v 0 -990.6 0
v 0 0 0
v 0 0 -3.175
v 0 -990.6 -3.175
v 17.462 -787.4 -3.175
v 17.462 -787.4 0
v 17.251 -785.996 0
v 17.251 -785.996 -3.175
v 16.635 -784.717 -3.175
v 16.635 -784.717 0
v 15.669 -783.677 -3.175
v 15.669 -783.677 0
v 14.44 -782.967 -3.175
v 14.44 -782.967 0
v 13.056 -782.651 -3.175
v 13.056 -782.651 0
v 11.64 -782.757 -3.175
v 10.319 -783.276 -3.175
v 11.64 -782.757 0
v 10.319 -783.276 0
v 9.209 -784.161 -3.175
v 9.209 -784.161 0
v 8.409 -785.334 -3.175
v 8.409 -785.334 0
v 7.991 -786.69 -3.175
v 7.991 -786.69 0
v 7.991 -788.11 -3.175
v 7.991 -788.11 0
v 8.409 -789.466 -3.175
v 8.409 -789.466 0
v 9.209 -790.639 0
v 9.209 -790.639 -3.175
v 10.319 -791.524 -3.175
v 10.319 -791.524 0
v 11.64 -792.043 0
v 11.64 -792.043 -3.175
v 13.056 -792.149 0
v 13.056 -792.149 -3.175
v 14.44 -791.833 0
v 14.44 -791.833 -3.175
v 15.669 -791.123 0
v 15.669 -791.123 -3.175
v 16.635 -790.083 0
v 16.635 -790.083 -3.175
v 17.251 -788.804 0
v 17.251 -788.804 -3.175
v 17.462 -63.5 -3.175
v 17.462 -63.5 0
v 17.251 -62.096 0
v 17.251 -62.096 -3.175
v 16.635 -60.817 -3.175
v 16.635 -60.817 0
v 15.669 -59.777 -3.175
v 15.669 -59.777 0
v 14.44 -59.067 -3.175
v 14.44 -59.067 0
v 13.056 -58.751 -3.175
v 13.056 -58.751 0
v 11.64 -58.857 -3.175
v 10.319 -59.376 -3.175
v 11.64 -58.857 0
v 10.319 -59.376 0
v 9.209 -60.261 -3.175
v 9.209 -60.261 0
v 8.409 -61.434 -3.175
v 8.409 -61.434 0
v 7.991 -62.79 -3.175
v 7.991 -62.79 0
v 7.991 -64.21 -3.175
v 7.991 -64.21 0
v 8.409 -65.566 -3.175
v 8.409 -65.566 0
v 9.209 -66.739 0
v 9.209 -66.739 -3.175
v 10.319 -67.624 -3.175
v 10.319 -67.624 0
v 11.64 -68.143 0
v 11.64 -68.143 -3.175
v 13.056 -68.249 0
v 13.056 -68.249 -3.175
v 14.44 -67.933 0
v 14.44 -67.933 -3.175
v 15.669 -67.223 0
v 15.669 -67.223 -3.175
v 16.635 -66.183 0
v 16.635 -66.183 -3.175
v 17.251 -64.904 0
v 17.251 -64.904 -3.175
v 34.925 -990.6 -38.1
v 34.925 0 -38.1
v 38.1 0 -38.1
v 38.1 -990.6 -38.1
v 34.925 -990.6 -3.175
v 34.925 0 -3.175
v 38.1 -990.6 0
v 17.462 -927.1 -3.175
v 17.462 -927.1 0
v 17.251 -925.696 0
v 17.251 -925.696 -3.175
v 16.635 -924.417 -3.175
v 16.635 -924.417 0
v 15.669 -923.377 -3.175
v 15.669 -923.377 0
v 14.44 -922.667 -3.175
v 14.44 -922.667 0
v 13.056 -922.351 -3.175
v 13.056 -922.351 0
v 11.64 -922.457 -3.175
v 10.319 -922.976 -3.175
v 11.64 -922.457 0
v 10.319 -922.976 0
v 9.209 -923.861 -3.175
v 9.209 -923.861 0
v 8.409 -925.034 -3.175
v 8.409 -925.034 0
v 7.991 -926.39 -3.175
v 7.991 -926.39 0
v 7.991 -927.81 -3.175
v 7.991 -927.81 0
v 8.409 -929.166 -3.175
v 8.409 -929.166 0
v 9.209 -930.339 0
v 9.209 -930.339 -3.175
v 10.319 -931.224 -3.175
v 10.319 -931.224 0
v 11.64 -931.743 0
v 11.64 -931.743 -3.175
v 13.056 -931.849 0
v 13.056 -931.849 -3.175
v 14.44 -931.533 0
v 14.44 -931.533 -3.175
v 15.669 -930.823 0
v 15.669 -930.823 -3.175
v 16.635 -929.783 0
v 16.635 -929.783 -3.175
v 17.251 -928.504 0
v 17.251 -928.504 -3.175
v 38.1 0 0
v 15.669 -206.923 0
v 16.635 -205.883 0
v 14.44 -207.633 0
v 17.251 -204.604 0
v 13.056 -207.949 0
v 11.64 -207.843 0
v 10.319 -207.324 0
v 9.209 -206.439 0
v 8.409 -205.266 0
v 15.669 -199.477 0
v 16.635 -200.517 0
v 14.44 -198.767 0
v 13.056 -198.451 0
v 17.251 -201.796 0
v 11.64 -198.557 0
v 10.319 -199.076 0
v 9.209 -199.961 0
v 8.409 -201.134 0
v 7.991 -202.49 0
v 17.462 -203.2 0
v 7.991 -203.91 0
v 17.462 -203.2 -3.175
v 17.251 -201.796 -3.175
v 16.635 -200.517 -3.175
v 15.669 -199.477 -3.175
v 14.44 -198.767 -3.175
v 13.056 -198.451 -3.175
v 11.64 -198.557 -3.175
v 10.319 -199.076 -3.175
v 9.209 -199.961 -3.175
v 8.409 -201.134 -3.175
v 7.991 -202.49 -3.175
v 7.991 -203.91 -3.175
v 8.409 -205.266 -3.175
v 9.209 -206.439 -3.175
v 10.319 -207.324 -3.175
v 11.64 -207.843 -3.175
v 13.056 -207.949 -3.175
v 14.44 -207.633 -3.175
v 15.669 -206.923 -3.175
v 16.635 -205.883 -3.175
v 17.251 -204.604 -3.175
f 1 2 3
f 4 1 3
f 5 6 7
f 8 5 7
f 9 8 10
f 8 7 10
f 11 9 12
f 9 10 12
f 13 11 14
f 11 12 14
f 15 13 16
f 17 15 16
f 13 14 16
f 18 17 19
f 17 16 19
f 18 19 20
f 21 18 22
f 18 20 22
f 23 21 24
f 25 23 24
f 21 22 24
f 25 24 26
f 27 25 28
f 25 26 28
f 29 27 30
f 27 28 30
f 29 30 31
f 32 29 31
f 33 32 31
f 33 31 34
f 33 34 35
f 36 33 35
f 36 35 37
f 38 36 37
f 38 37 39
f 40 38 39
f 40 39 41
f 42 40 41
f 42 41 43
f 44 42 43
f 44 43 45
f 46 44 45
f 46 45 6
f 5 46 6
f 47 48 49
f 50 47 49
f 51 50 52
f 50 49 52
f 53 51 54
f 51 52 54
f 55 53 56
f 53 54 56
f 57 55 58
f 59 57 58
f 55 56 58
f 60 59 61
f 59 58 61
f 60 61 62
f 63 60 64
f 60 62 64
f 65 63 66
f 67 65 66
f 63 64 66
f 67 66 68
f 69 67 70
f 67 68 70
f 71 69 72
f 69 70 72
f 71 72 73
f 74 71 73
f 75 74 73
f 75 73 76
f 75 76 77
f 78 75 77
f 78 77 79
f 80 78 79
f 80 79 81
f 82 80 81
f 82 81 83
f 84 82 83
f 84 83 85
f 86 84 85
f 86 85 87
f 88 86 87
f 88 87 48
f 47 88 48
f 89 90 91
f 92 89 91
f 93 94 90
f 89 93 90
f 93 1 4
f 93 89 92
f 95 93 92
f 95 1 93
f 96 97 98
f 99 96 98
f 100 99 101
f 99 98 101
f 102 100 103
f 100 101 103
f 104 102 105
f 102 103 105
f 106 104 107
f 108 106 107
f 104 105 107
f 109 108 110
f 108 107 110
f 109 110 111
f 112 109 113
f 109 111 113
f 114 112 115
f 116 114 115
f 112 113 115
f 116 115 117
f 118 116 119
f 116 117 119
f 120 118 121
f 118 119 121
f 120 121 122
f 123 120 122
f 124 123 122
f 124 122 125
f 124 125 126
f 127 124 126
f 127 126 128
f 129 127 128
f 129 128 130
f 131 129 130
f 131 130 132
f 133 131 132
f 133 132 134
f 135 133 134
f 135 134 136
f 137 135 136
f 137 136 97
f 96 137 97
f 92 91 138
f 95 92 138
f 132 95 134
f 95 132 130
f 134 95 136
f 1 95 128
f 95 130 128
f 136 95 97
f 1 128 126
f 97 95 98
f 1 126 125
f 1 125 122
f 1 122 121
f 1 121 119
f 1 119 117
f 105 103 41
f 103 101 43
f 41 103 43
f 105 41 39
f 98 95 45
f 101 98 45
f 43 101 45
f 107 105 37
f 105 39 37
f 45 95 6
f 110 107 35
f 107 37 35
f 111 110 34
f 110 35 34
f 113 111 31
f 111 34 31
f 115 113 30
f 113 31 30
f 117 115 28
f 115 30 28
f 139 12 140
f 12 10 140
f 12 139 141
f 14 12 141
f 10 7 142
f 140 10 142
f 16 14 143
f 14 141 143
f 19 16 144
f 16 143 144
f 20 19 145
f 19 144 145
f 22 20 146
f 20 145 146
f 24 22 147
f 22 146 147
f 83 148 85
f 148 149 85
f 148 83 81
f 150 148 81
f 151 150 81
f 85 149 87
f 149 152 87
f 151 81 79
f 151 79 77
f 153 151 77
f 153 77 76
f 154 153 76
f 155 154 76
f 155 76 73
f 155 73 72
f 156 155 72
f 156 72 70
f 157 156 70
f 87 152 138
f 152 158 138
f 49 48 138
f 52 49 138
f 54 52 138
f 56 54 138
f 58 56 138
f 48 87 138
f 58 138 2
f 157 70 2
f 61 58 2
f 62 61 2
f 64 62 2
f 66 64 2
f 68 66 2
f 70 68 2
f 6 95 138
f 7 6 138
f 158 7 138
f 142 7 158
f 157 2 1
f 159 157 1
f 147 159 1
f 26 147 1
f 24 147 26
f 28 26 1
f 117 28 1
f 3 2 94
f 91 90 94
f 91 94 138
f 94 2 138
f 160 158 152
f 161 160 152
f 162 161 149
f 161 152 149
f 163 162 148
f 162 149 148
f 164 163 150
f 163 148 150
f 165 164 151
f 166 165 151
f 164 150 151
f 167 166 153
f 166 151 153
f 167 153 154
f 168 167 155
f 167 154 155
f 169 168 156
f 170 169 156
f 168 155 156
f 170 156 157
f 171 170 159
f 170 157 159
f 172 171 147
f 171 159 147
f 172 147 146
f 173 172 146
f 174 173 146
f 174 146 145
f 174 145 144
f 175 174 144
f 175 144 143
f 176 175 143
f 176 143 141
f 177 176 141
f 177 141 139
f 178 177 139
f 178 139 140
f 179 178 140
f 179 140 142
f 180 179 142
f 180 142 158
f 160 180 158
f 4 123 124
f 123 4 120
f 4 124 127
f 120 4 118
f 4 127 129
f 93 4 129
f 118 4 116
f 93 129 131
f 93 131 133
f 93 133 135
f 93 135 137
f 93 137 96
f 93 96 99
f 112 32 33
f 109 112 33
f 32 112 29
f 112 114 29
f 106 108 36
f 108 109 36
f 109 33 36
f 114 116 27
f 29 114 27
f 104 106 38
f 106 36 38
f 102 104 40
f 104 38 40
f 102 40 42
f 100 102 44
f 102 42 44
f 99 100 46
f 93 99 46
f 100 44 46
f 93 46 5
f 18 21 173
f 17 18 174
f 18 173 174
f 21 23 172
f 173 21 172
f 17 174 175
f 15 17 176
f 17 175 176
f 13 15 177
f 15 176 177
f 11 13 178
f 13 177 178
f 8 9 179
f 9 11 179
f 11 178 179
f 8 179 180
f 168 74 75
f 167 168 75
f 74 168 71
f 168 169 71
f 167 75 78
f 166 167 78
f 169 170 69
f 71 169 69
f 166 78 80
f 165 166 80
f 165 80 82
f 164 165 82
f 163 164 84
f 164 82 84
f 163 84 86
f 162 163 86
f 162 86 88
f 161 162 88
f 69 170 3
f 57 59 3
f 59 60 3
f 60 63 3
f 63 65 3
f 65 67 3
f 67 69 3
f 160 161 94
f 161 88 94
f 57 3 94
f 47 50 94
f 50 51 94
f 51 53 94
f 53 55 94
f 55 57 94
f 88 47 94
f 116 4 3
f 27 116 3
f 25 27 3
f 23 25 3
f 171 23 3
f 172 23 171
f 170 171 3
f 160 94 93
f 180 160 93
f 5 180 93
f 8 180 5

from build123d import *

# Parameters (mm, degrees)
F1_DEPTH = 990.6
F2_R     = 4.7625
F3_DEPTH = 38.101


with BuildPart() as f1:
    # F0 (on Front) → F1 (new body)
    with BuildSketch(Plane.XZ):
        Polygon((38.1, 0), (0, 0), (0, -3.175), (34.925, -3.175), (34.925, -38.1), (38.1, -38.1), align=None)
    extrude(amount=F1_DEPTH)

    # F2 (on face) → F3 (cut, through all)
    with BuildSketch(Plane.XY):
        with Locations((12.7, -927.1)):
            Circle(F2_R)
        with Locations((12.7, -787.4)):
            Circle(F2_R)
        with Locations((12.7, -203.2)):
            Circle(F2_R)
        with Locations((12.7, -63.5)):
            Circle(F2_R)
    extrude(amount=-F3_DEPTH, mode=Mode.SUBTRACT)


solid = f1.part
